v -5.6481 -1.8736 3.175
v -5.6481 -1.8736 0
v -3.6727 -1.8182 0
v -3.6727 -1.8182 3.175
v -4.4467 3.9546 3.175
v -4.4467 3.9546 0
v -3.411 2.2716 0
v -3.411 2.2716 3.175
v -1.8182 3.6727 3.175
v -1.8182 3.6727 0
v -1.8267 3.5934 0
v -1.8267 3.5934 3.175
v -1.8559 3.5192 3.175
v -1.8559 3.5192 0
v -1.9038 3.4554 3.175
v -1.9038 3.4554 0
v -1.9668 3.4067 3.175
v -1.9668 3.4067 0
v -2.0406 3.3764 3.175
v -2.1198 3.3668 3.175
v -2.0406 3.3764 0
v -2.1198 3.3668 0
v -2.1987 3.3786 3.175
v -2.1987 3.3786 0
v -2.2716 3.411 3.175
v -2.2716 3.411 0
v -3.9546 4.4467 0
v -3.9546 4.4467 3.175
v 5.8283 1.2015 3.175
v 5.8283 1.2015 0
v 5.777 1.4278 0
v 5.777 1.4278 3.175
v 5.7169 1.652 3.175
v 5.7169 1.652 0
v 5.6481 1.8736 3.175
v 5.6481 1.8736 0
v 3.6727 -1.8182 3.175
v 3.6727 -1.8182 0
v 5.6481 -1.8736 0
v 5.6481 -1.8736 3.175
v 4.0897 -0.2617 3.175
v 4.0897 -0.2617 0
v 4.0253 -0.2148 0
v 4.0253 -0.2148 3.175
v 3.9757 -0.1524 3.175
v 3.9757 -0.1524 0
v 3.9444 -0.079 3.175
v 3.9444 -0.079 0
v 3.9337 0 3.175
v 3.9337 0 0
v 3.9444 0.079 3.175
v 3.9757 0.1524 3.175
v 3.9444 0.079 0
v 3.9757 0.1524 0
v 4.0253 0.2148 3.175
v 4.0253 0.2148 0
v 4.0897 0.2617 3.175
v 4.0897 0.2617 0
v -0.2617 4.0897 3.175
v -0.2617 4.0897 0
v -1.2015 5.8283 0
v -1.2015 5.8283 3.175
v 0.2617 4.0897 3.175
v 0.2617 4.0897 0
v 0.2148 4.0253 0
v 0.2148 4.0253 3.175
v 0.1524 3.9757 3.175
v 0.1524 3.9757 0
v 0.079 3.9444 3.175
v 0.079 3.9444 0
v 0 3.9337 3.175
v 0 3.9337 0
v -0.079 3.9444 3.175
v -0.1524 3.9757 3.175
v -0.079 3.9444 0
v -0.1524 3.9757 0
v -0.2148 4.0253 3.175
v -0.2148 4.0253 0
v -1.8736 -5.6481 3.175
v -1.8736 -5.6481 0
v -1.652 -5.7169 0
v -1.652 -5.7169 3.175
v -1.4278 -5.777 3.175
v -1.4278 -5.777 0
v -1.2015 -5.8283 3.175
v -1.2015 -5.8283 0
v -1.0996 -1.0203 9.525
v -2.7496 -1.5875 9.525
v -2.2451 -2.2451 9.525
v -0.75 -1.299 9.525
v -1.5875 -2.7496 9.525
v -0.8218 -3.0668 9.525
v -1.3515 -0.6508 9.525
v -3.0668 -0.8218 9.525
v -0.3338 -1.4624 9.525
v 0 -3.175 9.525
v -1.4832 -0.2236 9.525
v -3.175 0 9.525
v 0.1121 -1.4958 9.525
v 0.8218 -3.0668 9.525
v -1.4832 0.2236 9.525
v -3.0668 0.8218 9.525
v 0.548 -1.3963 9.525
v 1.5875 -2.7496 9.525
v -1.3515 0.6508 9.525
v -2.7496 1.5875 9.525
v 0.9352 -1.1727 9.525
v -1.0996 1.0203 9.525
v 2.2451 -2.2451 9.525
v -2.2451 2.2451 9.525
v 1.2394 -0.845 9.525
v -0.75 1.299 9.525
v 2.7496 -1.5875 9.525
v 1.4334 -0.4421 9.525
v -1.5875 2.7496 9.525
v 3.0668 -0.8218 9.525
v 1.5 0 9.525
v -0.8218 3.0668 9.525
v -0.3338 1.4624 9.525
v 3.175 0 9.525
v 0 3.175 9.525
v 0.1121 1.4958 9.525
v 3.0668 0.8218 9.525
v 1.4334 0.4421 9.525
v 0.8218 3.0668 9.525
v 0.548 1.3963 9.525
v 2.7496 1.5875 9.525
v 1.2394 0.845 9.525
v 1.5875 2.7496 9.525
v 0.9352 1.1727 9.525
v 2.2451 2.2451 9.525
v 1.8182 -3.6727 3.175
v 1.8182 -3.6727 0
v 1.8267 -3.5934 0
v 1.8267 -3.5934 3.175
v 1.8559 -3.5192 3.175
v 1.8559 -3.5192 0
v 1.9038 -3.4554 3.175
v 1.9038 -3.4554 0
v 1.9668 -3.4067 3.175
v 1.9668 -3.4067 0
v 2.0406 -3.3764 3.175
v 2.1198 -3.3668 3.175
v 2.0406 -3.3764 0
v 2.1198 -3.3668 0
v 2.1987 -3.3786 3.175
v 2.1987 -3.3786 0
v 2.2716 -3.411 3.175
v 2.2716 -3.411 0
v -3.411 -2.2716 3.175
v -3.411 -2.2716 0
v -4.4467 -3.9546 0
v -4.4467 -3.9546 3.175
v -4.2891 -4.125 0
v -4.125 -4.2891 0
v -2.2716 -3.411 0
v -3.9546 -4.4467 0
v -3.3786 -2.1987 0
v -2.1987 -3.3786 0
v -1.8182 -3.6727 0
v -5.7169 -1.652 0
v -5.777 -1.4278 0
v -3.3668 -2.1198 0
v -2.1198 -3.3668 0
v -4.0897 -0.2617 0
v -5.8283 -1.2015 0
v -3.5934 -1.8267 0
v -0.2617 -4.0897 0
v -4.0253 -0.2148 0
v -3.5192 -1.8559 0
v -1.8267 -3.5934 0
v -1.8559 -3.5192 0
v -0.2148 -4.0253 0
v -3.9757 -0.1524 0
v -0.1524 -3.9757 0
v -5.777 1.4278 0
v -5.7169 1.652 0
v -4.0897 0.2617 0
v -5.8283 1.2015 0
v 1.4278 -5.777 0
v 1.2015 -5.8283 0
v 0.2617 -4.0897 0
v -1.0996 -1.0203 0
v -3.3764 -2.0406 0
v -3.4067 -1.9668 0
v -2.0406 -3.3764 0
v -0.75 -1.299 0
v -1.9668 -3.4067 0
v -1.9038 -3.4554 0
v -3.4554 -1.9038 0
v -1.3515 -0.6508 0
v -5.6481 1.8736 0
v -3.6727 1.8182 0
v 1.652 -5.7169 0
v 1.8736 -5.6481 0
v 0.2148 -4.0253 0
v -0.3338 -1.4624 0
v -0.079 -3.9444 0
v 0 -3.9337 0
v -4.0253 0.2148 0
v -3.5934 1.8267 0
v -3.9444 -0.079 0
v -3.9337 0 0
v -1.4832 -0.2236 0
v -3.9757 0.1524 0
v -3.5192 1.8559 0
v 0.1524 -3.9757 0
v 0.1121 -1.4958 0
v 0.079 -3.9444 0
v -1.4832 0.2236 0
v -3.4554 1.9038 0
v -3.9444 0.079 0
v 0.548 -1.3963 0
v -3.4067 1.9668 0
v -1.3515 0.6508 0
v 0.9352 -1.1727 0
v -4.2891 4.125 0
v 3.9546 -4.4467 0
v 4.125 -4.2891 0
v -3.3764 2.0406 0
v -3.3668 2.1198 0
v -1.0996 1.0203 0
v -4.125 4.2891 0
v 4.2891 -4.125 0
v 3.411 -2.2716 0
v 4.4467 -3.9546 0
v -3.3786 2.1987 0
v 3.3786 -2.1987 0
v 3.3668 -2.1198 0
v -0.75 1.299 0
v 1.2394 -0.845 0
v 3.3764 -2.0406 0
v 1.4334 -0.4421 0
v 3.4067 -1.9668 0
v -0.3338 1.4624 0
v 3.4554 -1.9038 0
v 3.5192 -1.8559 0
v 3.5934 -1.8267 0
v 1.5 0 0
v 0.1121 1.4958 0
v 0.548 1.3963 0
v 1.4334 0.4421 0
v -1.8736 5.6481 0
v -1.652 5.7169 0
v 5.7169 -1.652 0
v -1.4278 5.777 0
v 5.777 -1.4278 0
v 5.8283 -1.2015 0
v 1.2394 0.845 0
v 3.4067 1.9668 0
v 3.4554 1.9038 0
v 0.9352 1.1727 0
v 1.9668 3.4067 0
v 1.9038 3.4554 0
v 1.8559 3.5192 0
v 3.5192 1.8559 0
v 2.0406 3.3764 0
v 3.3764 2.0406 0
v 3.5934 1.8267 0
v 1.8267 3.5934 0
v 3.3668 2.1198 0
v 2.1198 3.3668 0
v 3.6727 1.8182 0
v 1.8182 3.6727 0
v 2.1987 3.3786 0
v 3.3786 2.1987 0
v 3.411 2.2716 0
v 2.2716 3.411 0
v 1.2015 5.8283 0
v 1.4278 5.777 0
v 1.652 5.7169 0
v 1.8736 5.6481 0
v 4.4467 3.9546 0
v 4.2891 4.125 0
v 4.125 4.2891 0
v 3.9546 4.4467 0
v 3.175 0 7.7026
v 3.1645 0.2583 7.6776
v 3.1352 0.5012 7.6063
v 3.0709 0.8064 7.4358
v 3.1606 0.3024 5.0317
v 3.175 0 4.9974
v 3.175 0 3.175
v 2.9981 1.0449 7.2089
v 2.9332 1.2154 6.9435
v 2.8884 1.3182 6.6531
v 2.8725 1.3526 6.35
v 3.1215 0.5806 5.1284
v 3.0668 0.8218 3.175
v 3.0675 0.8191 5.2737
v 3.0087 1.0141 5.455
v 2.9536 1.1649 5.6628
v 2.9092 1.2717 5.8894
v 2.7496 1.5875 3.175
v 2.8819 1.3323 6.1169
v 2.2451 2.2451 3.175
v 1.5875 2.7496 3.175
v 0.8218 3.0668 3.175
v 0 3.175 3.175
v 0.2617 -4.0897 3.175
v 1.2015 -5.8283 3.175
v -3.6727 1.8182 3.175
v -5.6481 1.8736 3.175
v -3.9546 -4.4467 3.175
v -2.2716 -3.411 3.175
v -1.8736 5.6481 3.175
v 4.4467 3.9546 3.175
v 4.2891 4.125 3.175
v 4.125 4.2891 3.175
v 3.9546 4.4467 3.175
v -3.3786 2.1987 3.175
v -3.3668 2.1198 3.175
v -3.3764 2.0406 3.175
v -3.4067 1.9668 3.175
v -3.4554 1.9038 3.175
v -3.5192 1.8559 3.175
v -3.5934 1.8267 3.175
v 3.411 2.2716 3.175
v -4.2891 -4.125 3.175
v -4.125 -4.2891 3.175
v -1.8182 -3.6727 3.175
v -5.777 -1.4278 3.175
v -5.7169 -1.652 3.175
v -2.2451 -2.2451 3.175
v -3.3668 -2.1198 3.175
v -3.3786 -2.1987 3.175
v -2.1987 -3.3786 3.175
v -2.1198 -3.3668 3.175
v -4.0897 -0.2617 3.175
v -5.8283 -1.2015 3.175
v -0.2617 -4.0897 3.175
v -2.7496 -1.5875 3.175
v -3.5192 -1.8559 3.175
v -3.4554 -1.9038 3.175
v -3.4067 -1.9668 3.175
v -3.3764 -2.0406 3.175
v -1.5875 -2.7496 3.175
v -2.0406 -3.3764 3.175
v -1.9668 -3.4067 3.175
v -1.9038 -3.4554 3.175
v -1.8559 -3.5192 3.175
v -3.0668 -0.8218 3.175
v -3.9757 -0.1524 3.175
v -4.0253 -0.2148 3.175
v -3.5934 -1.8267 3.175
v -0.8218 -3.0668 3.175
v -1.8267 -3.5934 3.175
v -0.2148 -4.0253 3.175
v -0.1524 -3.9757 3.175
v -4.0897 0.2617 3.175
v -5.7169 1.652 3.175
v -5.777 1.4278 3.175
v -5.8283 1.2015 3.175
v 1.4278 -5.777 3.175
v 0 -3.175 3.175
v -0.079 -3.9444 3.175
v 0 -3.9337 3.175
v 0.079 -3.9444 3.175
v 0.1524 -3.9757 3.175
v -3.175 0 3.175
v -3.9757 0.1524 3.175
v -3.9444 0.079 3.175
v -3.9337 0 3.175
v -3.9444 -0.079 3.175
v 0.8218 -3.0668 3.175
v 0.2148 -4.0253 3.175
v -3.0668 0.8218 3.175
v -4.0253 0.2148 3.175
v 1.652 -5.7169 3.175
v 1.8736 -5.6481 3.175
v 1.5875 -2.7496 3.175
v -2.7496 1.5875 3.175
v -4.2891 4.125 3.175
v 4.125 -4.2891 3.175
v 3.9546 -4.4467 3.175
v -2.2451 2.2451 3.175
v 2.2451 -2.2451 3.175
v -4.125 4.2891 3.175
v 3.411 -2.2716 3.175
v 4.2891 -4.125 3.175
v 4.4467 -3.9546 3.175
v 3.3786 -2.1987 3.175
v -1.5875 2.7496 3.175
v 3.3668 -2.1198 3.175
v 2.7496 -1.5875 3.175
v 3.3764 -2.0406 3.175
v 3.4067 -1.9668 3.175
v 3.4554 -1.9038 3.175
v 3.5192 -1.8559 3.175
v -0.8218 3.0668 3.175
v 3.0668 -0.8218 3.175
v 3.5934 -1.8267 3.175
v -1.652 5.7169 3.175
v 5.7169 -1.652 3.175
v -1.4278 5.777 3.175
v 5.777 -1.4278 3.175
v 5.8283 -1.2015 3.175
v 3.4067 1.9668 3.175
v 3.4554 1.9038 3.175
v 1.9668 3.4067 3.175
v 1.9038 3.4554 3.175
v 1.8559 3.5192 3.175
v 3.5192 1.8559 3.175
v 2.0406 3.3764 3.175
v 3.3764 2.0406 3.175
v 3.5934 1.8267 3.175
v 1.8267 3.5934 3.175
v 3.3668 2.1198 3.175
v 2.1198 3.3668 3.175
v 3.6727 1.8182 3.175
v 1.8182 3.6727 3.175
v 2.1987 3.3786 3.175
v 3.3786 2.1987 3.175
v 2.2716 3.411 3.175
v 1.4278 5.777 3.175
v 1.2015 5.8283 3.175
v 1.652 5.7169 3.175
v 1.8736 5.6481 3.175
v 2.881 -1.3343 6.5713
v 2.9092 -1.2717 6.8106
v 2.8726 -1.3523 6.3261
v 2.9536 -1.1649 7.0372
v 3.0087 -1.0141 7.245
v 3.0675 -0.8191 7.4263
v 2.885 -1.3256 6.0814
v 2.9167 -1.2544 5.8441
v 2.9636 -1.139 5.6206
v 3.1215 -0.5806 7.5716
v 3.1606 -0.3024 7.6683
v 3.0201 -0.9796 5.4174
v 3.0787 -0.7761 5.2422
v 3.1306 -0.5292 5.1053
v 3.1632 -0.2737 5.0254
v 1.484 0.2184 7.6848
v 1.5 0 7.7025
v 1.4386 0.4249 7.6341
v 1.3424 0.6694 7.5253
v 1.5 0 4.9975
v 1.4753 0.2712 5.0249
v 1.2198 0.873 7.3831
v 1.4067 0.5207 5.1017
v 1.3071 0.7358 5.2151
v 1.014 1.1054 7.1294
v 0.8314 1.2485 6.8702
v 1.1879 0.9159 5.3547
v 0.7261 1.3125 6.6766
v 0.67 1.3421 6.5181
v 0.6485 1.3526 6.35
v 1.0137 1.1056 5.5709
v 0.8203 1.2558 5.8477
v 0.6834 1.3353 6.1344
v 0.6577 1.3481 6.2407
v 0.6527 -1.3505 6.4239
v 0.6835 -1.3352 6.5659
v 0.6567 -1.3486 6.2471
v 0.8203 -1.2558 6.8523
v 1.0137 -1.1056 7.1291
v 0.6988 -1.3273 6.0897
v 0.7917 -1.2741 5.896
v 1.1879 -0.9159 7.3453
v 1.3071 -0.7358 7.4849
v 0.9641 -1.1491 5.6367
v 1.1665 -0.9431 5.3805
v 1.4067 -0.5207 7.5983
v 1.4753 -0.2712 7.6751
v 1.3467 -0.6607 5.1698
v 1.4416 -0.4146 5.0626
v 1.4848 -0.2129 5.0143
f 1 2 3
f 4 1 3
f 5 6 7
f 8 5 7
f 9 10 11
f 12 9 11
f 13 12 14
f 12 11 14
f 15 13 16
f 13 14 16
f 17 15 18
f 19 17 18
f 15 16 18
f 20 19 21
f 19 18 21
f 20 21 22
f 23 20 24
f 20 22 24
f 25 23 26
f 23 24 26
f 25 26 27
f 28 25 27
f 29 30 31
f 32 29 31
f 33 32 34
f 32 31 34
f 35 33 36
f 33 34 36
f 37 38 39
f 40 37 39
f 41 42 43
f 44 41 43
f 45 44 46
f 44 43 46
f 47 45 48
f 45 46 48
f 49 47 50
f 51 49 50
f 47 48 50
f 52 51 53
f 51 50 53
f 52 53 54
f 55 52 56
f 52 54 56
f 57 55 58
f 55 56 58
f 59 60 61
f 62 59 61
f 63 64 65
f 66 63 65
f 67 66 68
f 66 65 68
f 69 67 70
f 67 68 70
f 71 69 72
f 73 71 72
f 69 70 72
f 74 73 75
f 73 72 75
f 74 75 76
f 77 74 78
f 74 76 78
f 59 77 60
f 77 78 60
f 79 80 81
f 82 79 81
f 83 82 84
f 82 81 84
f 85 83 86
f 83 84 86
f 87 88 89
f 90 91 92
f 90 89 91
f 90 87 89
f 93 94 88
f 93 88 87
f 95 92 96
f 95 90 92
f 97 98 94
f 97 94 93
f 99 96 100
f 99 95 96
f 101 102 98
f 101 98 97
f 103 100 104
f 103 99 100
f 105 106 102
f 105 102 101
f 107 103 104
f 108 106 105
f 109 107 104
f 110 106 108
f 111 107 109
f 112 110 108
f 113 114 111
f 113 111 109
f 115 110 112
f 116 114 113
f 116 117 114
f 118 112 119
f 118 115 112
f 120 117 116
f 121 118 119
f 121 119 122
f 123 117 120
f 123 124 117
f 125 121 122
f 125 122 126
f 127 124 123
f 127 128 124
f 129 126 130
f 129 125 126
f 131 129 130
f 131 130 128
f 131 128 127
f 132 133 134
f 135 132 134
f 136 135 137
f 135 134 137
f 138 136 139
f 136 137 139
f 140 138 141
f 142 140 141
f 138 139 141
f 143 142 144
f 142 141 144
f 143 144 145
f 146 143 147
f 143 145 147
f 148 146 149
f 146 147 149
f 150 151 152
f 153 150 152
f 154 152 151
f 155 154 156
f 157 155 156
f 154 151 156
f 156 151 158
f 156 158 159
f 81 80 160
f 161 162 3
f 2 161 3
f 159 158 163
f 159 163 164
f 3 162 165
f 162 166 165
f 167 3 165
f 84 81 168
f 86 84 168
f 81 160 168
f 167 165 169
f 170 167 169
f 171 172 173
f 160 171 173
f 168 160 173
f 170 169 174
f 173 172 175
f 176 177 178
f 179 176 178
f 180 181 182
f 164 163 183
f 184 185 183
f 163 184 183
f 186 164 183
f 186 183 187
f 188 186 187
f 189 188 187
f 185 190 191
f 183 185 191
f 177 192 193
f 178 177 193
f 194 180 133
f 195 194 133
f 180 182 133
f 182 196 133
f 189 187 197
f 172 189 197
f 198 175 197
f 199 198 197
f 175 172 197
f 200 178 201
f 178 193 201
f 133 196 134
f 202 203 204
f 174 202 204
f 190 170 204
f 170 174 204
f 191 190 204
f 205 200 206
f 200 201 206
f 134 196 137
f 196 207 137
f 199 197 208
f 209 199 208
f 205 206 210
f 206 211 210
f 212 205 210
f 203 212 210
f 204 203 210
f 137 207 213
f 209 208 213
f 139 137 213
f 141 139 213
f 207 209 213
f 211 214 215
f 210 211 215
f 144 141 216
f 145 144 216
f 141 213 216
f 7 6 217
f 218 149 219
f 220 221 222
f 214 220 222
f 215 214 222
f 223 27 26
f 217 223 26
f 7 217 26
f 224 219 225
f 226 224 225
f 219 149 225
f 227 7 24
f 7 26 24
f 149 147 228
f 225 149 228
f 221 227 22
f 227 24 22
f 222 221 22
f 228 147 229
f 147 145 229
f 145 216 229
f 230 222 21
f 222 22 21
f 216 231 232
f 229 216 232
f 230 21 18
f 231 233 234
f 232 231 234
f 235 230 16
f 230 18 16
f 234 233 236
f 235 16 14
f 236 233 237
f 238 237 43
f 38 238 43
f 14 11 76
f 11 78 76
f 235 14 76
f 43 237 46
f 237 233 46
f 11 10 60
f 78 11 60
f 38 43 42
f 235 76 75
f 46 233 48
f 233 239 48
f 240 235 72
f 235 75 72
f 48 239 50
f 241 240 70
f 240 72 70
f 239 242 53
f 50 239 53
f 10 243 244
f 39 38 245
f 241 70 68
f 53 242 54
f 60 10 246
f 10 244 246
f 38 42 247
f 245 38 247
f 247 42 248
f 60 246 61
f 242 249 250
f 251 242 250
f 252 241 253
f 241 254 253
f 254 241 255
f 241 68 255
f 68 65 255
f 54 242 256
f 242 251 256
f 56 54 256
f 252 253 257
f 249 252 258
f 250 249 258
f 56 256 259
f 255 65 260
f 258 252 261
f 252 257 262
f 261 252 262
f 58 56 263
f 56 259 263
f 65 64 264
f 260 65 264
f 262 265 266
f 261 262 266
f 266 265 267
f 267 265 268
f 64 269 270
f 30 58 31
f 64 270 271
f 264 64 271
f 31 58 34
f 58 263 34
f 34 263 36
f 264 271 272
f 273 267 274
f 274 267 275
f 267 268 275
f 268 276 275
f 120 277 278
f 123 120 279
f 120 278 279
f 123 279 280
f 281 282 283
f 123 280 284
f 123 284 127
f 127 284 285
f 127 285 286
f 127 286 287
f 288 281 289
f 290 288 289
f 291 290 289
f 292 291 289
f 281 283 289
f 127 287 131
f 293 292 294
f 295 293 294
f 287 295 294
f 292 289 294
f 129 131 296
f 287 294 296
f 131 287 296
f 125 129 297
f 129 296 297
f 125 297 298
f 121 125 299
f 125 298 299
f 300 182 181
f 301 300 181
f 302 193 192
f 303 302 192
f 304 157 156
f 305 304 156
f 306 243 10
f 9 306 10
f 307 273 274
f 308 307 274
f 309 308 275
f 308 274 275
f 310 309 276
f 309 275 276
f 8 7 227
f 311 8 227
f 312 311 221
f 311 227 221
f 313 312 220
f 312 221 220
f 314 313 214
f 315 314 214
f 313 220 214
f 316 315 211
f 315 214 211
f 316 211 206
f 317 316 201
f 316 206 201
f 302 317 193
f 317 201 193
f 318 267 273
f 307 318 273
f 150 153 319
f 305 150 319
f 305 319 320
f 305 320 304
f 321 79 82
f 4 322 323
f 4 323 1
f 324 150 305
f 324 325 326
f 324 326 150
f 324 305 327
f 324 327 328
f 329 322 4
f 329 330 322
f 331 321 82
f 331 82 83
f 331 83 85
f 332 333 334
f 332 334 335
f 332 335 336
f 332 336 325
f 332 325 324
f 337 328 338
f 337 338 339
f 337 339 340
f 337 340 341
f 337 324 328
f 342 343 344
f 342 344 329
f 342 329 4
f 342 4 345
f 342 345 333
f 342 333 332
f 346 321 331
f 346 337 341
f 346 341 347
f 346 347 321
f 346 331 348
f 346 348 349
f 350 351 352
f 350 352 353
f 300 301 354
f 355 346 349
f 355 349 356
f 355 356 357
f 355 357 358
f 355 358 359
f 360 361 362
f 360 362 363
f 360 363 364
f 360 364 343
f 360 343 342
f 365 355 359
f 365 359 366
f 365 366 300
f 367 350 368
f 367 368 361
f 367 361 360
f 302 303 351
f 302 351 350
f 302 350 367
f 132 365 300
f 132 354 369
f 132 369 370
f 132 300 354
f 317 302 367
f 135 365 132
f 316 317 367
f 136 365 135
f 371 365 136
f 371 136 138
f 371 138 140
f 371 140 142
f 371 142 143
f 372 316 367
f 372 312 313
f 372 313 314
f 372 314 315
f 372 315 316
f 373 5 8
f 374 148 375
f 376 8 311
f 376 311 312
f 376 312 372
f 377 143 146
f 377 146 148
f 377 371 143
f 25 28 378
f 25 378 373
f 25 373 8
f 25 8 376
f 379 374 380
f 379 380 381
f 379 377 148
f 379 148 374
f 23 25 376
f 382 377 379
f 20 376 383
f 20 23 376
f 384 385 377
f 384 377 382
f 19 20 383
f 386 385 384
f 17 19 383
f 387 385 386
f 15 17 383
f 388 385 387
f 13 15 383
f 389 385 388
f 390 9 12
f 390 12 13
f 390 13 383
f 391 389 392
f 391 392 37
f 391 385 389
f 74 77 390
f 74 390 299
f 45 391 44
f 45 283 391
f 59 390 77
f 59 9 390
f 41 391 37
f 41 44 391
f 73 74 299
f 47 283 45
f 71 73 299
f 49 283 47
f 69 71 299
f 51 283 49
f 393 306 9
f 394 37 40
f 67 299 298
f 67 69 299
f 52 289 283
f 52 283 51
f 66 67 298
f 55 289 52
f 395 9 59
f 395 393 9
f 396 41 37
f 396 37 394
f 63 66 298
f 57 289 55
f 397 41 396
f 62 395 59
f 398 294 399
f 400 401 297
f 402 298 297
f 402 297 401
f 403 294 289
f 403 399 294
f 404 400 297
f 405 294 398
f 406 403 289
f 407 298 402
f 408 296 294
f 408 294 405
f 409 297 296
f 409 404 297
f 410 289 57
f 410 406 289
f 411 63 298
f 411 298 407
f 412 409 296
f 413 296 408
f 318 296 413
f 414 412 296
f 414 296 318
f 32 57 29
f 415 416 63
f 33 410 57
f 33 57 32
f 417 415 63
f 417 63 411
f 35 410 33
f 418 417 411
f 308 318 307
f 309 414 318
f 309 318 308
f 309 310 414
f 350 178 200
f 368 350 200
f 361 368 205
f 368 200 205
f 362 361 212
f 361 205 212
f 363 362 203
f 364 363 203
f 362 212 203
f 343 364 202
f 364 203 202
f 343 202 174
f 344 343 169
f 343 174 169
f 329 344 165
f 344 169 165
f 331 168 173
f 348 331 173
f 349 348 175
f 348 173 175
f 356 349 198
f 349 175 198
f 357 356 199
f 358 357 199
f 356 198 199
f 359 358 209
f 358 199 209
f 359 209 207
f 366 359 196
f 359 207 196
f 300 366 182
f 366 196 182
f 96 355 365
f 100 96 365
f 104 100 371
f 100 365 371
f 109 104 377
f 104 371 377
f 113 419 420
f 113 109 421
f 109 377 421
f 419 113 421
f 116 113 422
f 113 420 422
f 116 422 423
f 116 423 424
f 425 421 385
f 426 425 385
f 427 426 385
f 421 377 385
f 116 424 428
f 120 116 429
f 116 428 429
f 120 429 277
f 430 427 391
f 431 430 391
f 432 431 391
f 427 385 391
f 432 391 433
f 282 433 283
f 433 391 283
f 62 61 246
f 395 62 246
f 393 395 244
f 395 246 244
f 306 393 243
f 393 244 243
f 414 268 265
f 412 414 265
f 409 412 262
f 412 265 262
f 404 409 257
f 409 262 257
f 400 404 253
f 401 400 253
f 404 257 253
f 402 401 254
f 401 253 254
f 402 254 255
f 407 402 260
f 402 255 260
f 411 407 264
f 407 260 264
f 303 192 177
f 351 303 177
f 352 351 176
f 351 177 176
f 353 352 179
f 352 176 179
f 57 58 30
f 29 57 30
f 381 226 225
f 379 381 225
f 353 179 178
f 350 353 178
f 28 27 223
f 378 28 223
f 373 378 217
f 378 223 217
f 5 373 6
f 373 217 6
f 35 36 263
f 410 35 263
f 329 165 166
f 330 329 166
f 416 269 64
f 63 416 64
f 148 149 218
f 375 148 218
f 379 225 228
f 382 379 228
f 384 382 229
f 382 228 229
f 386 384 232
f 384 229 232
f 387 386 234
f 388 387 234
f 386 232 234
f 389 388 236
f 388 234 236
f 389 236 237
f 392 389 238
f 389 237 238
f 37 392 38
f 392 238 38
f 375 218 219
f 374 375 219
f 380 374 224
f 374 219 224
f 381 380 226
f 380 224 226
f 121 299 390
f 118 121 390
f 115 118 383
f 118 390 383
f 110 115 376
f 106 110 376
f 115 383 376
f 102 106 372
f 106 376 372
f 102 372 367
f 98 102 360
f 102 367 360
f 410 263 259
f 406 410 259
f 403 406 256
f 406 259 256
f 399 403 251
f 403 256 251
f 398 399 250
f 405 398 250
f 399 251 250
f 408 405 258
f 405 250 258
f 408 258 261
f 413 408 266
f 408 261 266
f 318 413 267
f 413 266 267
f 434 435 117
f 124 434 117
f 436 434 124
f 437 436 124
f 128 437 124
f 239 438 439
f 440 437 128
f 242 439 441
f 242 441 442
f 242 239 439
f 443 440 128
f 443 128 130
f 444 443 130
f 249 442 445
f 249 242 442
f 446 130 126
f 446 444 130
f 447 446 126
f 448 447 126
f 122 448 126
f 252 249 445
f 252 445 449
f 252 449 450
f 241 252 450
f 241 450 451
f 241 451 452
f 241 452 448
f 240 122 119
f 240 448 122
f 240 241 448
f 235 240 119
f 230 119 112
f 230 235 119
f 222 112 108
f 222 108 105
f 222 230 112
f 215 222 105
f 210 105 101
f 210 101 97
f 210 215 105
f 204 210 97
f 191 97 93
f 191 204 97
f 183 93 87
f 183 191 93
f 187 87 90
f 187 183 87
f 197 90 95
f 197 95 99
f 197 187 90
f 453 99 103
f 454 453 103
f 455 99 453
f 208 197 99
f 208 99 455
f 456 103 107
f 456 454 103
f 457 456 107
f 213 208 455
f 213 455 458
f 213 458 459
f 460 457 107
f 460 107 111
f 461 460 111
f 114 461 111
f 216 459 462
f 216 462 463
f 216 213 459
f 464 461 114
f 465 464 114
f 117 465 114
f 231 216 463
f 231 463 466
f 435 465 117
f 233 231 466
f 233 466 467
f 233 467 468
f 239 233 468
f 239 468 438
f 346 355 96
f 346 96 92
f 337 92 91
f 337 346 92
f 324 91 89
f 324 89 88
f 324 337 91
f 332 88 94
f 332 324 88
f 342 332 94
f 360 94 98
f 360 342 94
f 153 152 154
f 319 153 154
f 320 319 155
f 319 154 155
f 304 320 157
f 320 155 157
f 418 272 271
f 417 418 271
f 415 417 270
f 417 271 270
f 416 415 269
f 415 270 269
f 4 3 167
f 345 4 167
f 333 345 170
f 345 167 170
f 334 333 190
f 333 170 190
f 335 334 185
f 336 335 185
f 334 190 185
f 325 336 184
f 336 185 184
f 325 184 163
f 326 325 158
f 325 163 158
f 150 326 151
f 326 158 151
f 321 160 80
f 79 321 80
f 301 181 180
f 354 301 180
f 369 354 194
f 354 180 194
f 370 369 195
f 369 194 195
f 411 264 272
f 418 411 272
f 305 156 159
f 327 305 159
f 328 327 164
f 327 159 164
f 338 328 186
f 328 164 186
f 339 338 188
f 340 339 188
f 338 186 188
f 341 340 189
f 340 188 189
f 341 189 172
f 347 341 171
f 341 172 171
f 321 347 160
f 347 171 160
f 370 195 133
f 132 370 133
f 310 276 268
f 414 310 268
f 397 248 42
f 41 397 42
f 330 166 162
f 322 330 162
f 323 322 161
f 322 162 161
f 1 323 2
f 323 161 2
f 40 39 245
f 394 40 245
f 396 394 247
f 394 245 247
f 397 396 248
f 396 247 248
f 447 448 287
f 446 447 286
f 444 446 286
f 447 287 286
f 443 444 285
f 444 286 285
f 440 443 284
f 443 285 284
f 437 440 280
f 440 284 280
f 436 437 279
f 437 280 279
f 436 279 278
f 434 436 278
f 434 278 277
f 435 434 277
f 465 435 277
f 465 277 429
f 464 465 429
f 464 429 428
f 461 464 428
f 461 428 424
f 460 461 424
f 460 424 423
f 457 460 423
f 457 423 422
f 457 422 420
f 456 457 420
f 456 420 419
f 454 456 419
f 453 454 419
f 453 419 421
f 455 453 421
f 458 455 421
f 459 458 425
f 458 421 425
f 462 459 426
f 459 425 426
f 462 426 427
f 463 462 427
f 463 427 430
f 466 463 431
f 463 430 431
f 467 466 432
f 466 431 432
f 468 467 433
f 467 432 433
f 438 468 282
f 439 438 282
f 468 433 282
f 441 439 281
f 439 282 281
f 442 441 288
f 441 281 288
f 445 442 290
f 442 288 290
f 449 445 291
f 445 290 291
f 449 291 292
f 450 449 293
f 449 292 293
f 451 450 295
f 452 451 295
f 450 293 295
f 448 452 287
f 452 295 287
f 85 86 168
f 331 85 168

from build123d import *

# Parameters (mm, degrees)
F0_R        = 5.9508004686
F0_R_2      = 1.5
F1_DEPTH    = 3.175
F2_W        = 6.35
F2_H        = 6.35
F2_R        = 1.5
F3_DEPTH    = 6.35
F4_R        = 1.35255
F5_REACH    = 12.9523895761
F6_T1_DEPTH = 6.35
F8_DEPTH    = 3.175
F9_COUNT    = 12
F9_ANGLE    = 330


# Not quite as in the source:
# - a fillet or chamfer that OpenCascade refuses, or shapes differently, is made with other operations: its cross-section is extruded or revolved along the edge and cut away or added


with BuildPart() as f1:
    # F0 (on Top) → F1 (new body)
    with BuildSketch(Plane.XY):
        Circle(F0_R)
        Circle(F0_R_2, mode=Mode.SUBTRACT)
    extrude(amount=F1_DEPTH)

    # F2 (on face) → F3 (join)
    with BuildSketch(Plane.XY.offset(3.175)):
        Rectangle(F2_W, F2_H)
        Circle(F2_R, mode=Mode.SUBTRACT)
    extrude(amount=F3_DEPTH)

    f5_end = f1.faces().sort_by_distance((-1.5, 0, 4.7625))[0]
    # F4 (on face) → F5 (cut, up to a face of the model that its end follows)
    with BuildSketch(Plane.YZ.offset(3.175)):
        with Locations((0, 6.35)):
            Circle(F4_R)
    f5_long = extrude(amount=-F5_REACH, mode=Mode.PRIVATE)
    add(split(f5_long, bisect_by=f5_end, keep=Keep.ALL, mode=Mode.PRIVATE).solids().sort_by_distance((3.175, 0, 6.35))[0], mode=Mode.SUBTRACT)

    # F6: fillet of radius 3.175 on 4 edges, made by hand

    # F6_s2 → F6_t1 (cut)
    with BuildSketch(Plane.XY.offset(3.175)):
        with BuildLine():
            ThreePointArc((0, -3.175), (2.2450640303, -2.2450640303), (3.175, 0))
            Line((3.175, 0), (3.2385, 0))
            Line((3.2385, 0), (3.2385, -3.2385))
            Line((3.2385, -3.2385), (0, -3.2385))
            Line((0, -3.2385), (0, -3.175))
        make_face()
        with BuildLine():
            ThreePointArc((0, -3.175), (-2.2450640303, -2.2450640303), (-3.175, 0))
            Line((-3.175, 0), (-3.2385, 0))
            Line((-3.2385, 0), (-3.2385, -3.2385))
            Line((-3.2385, -3.2385), (0, -3.2385))
            Line((0, -3.2385), (0, -3.175))
        make_face()
        with BuildLine():
            ThreePointArc((3.175, 0), (2.2450640303, 2.2450640303), (0, 3.175))
            Line((0, 3.175), (0, 3.2385))
            Line((0, 3.2385), (3.2385, 3.2385))
            Line((3.2385, 3.2385), (3.2385, 0))
            Line((3.2385, 0), (3.175, 0))
        make_face()
        with BuildLine():
            ThreePointArc((0, 3.175), (-2.2450640303, 2.2450640303), (-3.175, 0))
            Line((-3.175, 0), (-3.2385, 0))
            Line((-3.2385, 0), (-3.2385, 3.2385))
            Line((-3.2385, 3.2385), (0, 3.2385))
            Line((0, 3.2385), (0, 3.175))
        make_face()
    extrude(amount=F6_T1_DEPTH, mode=Mode.SUBTRACT)

    # F7 (on face) → F8 (cut, through all)
    with BuildSketch(Plane(origin=(0, 0, 0), x_dir=(1, 0, 0), z_dir=(0, 0, -1))):
        with BuildLine():
            Line((4.0897477961, -0.2617496271), (5.8282529848, -1.2014546857))
            ThreePointArc((5.8282529848, -1.2014546857), (5.9508004686, 0), (5.8282529848, 1.2014546857))
            Line((5.8282529848, 1.2014546857), (4.0897477961, 0.2617496271))
            ThreePointArc((4.0897477961, 0.2617496271), (3.9336899209, 0), (4.0897477961, -0.2617496271))
        make_face()
    f8 = extrude(amount=-F8_DEPTH, mode=Mode.SUBTRACT)

    # F9: F8 ×12 about axis
    f9_axis = Axis((0, 0, 0), (0, 0, -1))
    for i in range(1, F9_COUNT):
        add(f8.rotate(f9_axis, i * F9_ANGLE / (F9_COUNT - 1)), mode=Mode.SUBTRACT)


solid = f1.part
